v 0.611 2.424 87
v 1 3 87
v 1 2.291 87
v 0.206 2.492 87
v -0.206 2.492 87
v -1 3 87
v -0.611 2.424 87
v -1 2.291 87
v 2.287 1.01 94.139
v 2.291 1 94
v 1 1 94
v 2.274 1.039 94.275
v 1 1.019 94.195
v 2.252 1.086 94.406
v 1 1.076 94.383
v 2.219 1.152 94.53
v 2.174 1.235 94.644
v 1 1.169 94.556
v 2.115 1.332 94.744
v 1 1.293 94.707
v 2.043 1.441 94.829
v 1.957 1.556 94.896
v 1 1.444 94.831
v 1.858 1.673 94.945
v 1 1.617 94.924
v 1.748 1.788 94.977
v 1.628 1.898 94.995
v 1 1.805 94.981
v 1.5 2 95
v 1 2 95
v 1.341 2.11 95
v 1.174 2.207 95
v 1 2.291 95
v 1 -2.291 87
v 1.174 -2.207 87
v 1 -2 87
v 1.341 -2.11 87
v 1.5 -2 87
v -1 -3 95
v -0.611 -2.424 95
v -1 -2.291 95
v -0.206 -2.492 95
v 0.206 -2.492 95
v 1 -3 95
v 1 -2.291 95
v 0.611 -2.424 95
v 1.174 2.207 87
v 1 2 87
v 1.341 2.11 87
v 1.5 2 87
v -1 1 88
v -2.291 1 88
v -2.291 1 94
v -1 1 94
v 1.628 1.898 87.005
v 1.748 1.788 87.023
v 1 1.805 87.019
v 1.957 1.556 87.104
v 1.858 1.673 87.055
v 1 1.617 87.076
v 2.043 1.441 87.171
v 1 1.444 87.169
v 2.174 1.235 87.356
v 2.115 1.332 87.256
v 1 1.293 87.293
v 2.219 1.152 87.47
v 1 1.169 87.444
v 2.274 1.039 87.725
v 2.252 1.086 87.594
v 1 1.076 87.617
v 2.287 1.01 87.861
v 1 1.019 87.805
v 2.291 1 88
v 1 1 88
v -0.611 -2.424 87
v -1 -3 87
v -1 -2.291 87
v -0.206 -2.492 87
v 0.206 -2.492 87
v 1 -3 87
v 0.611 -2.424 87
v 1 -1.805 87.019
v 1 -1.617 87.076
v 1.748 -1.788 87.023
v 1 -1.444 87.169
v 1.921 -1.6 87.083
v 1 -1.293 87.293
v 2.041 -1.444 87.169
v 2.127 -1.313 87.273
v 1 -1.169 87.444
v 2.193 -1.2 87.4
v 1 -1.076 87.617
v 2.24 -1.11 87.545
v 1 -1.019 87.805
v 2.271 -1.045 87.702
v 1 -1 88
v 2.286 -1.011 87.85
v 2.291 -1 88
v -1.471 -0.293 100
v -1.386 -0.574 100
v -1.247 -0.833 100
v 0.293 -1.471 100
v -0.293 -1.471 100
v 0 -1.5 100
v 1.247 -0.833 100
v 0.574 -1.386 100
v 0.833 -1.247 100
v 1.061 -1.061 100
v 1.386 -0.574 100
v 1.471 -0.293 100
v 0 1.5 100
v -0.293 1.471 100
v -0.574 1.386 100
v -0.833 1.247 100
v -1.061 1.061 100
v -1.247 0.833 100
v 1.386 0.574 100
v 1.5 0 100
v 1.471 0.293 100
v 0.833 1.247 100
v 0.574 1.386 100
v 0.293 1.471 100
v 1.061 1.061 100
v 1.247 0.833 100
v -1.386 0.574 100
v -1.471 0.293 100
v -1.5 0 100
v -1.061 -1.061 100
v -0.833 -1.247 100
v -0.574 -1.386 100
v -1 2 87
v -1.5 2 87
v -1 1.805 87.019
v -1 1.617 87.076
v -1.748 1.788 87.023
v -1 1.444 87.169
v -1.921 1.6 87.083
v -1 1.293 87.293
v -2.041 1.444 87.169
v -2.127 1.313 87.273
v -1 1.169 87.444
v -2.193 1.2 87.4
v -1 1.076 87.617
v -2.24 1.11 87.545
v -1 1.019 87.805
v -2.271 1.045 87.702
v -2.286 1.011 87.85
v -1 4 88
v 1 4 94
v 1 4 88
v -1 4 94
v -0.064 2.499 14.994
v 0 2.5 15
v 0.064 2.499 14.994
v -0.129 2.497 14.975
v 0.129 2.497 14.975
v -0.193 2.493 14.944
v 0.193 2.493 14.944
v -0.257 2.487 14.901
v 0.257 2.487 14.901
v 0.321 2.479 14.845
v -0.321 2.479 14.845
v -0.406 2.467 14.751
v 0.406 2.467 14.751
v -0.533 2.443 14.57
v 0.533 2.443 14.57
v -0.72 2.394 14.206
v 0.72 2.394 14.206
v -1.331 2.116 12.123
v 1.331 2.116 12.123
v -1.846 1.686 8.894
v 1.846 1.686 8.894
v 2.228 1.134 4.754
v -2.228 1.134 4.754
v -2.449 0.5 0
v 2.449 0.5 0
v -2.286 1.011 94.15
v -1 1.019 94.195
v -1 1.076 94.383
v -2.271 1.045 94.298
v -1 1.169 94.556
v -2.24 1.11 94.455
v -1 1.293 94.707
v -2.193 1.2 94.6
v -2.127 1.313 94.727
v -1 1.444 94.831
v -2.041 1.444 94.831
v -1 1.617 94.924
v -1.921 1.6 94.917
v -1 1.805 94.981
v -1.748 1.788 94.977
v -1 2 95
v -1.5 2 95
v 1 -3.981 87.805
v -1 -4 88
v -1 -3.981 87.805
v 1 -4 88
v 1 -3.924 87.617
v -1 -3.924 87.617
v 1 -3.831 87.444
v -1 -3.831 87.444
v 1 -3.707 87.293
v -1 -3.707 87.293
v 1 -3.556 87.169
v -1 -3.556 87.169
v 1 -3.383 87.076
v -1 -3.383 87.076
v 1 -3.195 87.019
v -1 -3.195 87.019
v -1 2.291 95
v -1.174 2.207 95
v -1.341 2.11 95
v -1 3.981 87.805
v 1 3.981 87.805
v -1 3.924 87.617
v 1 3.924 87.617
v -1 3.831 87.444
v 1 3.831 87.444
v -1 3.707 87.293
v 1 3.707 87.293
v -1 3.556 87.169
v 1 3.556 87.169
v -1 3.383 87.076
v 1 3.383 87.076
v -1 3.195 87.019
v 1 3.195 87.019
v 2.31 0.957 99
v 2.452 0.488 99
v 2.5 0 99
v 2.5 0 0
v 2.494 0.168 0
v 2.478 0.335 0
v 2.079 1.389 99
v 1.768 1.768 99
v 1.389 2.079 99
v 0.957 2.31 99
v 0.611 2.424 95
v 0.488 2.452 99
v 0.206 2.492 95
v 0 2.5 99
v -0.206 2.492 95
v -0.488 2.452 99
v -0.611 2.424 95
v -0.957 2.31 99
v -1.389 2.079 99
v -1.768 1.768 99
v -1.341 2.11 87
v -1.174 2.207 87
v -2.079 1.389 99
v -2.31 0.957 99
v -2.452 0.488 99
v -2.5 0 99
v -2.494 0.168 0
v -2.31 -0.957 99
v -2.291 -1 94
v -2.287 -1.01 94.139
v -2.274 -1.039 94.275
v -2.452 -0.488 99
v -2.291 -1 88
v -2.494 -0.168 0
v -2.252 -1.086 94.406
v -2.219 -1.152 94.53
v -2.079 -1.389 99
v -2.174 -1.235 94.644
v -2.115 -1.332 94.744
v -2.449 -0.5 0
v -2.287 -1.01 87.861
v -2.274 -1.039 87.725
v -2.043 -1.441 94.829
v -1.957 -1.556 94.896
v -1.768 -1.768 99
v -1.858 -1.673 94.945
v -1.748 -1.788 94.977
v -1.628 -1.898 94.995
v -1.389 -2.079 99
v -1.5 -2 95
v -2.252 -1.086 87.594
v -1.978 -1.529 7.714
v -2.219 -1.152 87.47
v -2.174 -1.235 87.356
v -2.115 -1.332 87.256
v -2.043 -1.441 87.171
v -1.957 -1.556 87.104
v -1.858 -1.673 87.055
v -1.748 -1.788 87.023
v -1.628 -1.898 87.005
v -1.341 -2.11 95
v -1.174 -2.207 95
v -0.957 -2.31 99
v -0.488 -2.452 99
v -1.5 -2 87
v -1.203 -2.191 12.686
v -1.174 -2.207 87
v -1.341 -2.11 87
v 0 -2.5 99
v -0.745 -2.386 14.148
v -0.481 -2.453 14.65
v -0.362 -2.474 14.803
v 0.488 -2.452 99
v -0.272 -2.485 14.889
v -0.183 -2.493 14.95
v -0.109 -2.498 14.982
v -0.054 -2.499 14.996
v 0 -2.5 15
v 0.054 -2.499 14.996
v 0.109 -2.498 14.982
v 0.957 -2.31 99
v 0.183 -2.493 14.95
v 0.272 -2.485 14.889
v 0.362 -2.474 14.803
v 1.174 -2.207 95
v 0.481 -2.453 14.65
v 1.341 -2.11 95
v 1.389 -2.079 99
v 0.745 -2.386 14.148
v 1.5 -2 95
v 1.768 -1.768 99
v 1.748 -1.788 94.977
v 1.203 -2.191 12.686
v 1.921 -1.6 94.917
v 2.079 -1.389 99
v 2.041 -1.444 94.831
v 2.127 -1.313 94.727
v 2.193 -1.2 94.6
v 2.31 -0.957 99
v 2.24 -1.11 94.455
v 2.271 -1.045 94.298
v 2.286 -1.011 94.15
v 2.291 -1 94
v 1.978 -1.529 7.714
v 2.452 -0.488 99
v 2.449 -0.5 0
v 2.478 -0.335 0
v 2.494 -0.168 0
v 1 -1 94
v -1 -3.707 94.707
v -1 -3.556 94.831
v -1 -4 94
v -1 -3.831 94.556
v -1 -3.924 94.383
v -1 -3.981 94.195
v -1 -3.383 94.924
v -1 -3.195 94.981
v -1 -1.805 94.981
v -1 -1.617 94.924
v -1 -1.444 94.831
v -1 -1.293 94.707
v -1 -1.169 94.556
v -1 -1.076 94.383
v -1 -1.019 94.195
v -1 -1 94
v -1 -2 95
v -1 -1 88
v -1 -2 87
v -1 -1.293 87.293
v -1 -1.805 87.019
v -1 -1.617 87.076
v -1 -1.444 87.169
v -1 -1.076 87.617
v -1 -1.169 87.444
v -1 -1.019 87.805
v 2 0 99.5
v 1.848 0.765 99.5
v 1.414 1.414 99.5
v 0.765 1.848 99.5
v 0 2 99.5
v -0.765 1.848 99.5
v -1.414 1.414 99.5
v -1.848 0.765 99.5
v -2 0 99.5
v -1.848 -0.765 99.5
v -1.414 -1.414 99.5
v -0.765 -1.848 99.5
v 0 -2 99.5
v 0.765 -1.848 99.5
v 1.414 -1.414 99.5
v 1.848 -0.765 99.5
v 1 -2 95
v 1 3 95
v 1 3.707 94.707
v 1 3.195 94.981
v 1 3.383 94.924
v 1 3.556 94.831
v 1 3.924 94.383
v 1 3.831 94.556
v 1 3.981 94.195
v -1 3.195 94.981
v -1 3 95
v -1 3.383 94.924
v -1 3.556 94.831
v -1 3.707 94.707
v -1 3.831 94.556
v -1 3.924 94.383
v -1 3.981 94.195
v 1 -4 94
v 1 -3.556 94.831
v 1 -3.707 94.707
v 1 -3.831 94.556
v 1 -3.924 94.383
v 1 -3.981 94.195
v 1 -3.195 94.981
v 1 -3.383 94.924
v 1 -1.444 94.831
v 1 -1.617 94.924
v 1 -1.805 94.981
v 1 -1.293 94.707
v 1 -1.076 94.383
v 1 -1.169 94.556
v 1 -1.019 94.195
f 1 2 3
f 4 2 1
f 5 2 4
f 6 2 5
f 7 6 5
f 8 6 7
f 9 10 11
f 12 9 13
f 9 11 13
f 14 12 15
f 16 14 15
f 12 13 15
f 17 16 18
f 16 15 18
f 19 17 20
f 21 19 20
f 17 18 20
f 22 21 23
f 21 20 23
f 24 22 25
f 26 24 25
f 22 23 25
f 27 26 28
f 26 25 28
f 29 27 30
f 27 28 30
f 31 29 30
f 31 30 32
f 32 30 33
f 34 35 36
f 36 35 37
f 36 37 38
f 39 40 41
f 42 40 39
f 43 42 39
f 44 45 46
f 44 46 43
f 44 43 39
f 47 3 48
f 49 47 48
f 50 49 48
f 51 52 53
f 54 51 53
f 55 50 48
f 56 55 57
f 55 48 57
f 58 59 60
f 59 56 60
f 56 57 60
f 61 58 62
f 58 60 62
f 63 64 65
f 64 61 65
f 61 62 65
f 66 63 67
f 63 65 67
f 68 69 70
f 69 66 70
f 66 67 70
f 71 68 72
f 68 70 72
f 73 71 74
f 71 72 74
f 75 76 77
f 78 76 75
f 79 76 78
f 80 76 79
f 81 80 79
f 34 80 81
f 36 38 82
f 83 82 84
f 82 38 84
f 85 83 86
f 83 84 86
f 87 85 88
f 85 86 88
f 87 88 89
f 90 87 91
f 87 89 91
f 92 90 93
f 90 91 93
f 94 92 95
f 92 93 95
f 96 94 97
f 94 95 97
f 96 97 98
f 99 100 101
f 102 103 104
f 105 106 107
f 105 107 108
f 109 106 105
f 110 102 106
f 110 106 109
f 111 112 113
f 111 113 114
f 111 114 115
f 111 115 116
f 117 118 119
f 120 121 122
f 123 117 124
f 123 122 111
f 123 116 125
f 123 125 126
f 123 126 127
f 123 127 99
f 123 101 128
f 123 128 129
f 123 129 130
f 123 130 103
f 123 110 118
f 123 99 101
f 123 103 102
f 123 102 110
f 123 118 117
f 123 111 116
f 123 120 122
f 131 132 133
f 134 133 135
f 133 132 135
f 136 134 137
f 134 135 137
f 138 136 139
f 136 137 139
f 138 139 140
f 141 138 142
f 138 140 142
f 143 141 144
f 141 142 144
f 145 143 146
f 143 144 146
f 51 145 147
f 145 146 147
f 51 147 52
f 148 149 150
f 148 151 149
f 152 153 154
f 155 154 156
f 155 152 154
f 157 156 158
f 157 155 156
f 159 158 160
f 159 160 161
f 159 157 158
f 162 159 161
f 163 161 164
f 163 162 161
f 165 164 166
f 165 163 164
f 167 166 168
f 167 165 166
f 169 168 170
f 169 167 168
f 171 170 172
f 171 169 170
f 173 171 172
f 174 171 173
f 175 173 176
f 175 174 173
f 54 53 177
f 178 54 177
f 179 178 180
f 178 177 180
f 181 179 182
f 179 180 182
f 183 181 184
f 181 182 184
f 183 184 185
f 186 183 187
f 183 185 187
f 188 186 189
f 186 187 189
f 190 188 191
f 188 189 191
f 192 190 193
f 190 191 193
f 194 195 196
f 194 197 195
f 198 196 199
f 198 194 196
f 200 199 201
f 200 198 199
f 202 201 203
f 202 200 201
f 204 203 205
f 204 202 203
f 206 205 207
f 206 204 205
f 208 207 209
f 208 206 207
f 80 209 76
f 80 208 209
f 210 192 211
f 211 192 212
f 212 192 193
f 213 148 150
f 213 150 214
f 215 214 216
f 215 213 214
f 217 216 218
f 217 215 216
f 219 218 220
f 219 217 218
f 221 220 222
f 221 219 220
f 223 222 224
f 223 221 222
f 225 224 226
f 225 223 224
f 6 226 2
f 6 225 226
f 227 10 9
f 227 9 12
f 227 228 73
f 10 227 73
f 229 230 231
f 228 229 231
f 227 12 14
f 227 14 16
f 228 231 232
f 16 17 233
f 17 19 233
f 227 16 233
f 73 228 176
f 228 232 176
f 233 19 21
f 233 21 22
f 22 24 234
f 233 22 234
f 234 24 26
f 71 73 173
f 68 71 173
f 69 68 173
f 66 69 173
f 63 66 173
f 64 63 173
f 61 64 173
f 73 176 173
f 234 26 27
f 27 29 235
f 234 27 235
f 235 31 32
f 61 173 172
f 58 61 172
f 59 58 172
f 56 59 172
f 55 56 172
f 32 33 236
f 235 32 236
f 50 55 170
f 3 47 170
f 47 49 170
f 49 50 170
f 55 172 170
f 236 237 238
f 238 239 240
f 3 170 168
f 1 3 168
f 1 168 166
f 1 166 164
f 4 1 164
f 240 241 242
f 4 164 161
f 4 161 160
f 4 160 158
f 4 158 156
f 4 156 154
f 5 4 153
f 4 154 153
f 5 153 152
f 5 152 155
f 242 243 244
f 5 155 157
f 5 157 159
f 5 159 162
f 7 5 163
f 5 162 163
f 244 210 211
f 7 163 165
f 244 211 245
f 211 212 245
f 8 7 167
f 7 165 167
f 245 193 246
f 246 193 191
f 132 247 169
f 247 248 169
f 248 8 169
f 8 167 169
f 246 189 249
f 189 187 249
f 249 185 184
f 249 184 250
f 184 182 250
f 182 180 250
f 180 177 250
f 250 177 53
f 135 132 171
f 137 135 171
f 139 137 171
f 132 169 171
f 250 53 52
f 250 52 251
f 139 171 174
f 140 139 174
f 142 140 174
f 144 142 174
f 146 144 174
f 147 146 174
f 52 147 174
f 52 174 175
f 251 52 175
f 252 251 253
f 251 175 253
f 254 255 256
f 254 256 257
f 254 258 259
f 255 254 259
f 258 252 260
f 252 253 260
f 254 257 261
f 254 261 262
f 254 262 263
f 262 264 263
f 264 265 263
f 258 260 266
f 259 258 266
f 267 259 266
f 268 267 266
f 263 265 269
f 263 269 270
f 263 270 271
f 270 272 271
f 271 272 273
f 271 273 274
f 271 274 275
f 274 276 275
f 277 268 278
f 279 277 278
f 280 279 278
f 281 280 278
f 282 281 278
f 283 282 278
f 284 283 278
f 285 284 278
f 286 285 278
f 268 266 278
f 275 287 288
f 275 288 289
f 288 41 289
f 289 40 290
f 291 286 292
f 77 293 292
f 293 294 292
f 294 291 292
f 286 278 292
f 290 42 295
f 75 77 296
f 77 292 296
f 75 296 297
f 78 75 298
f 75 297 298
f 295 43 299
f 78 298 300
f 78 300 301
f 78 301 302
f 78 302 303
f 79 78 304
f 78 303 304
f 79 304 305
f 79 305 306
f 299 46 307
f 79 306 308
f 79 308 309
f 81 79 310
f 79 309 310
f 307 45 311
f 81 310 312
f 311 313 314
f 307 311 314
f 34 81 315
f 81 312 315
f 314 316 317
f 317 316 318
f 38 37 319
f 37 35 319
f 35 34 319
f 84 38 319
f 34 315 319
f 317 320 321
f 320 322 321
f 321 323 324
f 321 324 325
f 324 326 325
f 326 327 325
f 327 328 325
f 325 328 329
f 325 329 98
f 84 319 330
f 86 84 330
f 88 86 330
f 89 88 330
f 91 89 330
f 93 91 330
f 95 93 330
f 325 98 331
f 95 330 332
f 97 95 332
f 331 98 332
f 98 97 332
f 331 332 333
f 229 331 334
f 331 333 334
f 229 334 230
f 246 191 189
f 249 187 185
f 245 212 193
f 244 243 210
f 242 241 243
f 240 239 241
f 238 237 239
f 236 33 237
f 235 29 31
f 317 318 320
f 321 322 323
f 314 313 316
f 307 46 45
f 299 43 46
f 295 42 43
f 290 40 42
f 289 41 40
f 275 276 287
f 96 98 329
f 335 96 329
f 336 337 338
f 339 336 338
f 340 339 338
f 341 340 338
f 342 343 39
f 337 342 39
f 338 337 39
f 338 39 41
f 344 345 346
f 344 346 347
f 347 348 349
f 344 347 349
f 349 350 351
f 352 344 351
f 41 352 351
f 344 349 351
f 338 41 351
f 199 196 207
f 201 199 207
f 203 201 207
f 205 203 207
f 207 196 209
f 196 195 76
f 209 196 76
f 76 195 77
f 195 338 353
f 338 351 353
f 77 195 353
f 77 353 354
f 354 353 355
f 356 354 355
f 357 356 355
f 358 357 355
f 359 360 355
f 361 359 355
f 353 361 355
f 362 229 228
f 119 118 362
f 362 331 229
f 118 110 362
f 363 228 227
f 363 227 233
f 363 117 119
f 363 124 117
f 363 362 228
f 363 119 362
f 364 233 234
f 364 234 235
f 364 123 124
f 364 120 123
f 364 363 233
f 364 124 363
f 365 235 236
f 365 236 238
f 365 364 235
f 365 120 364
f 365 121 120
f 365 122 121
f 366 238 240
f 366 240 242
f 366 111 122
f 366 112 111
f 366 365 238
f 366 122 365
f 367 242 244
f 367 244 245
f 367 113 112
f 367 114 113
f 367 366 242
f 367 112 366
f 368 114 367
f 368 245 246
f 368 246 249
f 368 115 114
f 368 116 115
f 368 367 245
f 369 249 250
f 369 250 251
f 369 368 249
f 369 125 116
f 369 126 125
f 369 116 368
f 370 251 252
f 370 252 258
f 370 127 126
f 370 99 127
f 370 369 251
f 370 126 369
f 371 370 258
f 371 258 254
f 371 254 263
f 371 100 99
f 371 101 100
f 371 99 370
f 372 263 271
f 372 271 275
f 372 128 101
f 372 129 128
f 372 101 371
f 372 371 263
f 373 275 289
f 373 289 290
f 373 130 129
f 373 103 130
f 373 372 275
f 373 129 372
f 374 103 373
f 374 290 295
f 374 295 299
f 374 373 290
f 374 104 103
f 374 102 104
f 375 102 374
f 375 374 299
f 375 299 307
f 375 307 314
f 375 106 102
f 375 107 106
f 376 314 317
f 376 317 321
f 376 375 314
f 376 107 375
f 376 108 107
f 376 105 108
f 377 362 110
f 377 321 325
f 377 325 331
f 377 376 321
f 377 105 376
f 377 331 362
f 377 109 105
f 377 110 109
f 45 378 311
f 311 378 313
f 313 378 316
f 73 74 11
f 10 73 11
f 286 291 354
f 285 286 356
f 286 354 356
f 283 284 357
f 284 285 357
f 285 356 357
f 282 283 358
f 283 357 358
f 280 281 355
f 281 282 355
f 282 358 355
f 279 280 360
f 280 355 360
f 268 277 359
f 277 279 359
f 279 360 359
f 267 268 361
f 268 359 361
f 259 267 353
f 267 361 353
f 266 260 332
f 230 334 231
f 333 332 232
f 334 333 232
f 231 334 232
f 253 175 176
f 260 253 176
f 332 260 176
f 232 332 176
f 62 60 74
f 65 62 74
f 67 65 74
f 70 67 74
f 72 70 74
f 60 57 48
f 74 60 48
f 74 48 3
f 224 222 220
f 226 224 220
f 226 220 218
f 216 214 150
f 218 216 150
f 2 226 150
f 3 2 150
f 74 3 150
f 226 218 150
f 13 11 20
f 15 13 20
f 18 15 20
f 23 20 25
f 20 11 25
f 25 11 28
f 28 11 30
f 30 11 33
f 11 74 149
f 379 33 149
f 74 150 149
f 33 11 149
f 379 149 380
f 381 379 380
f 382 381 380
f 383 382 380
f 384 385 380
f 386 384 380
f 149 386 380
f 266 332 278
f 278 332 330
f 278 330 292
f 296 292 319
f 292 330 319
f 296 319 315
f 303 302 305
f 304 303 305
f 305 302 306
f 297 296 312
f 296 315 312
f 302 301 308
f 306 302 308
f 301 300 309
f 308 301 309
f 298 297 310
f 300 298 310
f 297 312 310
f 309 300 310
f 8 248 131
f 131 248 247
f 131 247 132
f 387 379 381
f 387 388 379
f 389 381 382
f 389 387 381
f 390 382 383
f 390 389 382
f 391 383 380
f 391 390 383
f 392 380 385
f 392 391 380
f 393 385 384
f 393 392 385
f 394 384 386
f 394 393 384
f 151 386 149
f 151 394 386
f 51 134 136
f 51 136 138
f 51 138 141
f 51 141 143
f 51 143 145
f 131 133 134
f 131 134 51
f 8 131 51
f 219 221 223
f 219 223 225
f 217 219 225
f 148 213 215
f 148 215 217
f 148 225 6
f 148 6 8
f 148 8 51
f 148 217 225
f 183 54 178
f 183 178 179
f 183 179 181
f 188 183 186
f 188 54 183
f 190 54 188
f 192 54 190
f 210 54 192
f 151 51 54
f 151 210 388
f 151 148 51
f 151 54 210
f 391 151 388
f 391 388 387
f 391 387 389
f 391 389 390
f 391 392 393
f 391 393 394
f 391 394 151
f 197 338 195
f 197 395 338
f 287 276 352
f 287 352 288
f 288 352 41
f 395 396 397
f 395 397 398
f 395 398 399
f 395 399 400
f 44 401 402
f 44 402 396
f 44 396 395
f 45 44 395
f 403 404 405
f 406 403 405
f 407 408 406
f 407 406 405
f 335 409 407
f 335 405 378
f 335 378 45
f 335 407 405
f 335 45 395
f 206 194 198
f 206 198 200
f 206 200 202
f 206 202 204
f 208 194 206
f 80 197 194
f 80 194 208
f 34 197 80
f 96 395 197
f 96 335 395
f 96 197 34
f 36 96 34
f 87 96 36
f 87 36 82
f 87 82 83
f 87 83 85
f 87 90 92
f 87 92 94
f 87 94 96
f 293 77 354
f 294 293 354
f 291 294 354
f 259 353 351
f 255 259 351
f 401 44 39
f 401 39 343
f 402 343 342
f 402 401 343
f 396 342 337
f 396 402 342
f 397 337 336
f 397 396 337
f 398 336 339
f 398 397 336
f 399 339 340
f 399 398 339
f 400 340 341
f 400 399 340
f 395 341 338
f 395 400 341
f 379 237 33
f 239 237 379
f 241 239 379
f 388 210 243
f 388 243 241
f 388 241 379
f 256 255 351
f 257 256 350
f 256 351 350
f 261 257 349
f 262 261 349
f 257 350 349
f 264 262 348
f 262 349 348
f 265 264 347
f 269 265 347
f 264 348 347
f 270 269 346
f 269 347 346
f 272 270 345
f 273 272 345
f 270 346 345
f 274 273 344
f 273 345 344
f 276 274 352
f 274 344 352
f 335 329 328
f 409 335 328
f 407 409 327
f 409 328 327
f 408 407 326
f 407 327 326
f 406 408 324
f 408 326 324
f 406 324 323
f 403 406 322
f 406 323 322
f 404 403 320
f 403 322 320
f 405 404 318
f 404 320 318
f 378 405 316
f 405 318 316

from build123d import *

# Parameters (mm, degrees)
SKETCH1_R               = 2.5
BOSS_EXTRUDE1_DEPTH     = 100
CUT_EXTRUDE1_DEPTH      = 5
BOSS_EXTRUDE2_DEPTH     = 1
CHAMFER1_SIZE           = 1
CUT_EXTRUDE2_DEPTH      = 101.111188188
CUT_EXTRUDE2_DEPTH_BACK = 101.111188188


with BuildPart() as part:
    # Sketch1 → Boss-Extrude1 (new body)
    with BuildSketch(Plane.XY):
        Circle(SKETCH1_R)
    extrude(amount=BOSS_EXTRUDE1_DEPTH)

    # Sketch2 → Cut-Extrude1 (cut, symmetric)
    with BuildSketch(Plane(origin=(0, 0, 0), x_dir=(0, 0, -1), z_dir=(1, 0, 0))):
        with BuildLine():
            Line((-94, 4), (-88, 4))
            ThreePointArc((-88, 4), (-87.292893219, 3.707106781), (-87, 3))
            Line((-87, 3), (-87, 2))
            ThreePointArc((-87, 2), (-87.292893219, 1.292893219), (-88, 1))
            Line((-88, 1), (-94, 1))
            ThreePointArc((-94, 1), (-94.707106781, 1.292893219), (-95, 2))
            Line((-95, 2), (-95, 3))
            ThreePointArc((-95, 3), (-94.707106781, 3.707106781), (-94, 4))
        make_face()
        with BuildLine():
            Line((-87, -3), (-87, -2))
            ThreePointArc((-87, -2), (-87.292893219, -1.292893219), (-88, -1))
            Line((-88, -1), (-94, -1))
            ThreePointArc((-94, -1), (-94.707106781, -1.292893219), (-95, -2))
            Line((-95, -2), (-95, -3))
            ThreePointArc((-95, -3), (-94.707106781, -3.707106781), (-94, -4))
            Line((-94, -4), (-88, -4))
            ThreePointArc((-88, -4), (-87.292893219, -3.707106781), (-87, -3))
        make_face()
    extrude(amount=CUT_EXTRUDE1_DEPTH, both=True, mode=Mode.SUBTRACT)

    # Sketch2<2> → Boss-Extrude2 (add, symmetric)
    with BuildSketch(Plane(origin=(0, 0, 0), x_dir=(0, 0, -1), z_dir=(1, 0, 0))):
        with BuildLine():
            Line((-94, 4), (-88, 4))
            ThreePointArc((-88, 4), (-87.292893219, 3.707106781), (-87, 3))
            Line((-87, 3), (-87, 2))
            ThreePointArc((-87, 2), (-87.292893219, 1.292893219), (-88, 1))
            Line((-88, 1), (-94, 1))
            ThreePointArc((-94, 1), (-94.707106781, 1.292893219), (-95, 2))
            Line((-95, 2), (-95, 3))
            ThreePointArc((-95, 3), (-94.707106781, 3.707106781), (-94, 4))
        make_face()
        with BuildLine():
            Line((-87, -3), (-87, -2))
            ThreePointArc((-87, -2), (-87.292893219, -1.292893219), (-88, -1))
            Line((-88, -1), (-94, -1))
            ThreePointArc((-94, -1), (-94.707106781, -1.292893219), (-95, -2))
            Line((-95, -2), (-95, -3))
            ThreePointArc((-95, -3), (-94.707106781, -3.707106781), (-94, -4))
            Line((-94, -4), (-88, -4))
            ThreePointArc((-88, -4), (-87.292893219, -3.707106781), (-87, -3))
        make_face()
    extrude(amount=BOSS_EXTRUDE2_DEPTH, both=True)

    # Chamfer1
    chamfer1_edges = [part.edges().sort_by_distance(p)[0] for p in [
        (-2.5, 0, 100),
    ]]
    chamfer(chamfer1_edges, length=CHAMFER1_SIZE)

    # Sketch3 → Cut-Extrude2 (cut, two sides: drawn at the far end of the back side and taken through both)
    with BuildSketch(Plane(origin=(0, 0, 0), x_dir=(0, 0, -1), z_dir=(1, 0, 0)).offset(-CUT_EXTRUDE2_DEPTH_BACK)):
        Polygon((0, -2.5), (0, -0.5), (-15, -2.5), align=None)
        Polygon((-15, 2.5), (0, 0.5), (0, 2.5), align=None)
    extrude(amount=CUT_EXTRUDE2_DEPTH + CUT_EXTRUDE2_DEPTH_BACK, mode=Mode.SUBTRACT)


solid = part.part
